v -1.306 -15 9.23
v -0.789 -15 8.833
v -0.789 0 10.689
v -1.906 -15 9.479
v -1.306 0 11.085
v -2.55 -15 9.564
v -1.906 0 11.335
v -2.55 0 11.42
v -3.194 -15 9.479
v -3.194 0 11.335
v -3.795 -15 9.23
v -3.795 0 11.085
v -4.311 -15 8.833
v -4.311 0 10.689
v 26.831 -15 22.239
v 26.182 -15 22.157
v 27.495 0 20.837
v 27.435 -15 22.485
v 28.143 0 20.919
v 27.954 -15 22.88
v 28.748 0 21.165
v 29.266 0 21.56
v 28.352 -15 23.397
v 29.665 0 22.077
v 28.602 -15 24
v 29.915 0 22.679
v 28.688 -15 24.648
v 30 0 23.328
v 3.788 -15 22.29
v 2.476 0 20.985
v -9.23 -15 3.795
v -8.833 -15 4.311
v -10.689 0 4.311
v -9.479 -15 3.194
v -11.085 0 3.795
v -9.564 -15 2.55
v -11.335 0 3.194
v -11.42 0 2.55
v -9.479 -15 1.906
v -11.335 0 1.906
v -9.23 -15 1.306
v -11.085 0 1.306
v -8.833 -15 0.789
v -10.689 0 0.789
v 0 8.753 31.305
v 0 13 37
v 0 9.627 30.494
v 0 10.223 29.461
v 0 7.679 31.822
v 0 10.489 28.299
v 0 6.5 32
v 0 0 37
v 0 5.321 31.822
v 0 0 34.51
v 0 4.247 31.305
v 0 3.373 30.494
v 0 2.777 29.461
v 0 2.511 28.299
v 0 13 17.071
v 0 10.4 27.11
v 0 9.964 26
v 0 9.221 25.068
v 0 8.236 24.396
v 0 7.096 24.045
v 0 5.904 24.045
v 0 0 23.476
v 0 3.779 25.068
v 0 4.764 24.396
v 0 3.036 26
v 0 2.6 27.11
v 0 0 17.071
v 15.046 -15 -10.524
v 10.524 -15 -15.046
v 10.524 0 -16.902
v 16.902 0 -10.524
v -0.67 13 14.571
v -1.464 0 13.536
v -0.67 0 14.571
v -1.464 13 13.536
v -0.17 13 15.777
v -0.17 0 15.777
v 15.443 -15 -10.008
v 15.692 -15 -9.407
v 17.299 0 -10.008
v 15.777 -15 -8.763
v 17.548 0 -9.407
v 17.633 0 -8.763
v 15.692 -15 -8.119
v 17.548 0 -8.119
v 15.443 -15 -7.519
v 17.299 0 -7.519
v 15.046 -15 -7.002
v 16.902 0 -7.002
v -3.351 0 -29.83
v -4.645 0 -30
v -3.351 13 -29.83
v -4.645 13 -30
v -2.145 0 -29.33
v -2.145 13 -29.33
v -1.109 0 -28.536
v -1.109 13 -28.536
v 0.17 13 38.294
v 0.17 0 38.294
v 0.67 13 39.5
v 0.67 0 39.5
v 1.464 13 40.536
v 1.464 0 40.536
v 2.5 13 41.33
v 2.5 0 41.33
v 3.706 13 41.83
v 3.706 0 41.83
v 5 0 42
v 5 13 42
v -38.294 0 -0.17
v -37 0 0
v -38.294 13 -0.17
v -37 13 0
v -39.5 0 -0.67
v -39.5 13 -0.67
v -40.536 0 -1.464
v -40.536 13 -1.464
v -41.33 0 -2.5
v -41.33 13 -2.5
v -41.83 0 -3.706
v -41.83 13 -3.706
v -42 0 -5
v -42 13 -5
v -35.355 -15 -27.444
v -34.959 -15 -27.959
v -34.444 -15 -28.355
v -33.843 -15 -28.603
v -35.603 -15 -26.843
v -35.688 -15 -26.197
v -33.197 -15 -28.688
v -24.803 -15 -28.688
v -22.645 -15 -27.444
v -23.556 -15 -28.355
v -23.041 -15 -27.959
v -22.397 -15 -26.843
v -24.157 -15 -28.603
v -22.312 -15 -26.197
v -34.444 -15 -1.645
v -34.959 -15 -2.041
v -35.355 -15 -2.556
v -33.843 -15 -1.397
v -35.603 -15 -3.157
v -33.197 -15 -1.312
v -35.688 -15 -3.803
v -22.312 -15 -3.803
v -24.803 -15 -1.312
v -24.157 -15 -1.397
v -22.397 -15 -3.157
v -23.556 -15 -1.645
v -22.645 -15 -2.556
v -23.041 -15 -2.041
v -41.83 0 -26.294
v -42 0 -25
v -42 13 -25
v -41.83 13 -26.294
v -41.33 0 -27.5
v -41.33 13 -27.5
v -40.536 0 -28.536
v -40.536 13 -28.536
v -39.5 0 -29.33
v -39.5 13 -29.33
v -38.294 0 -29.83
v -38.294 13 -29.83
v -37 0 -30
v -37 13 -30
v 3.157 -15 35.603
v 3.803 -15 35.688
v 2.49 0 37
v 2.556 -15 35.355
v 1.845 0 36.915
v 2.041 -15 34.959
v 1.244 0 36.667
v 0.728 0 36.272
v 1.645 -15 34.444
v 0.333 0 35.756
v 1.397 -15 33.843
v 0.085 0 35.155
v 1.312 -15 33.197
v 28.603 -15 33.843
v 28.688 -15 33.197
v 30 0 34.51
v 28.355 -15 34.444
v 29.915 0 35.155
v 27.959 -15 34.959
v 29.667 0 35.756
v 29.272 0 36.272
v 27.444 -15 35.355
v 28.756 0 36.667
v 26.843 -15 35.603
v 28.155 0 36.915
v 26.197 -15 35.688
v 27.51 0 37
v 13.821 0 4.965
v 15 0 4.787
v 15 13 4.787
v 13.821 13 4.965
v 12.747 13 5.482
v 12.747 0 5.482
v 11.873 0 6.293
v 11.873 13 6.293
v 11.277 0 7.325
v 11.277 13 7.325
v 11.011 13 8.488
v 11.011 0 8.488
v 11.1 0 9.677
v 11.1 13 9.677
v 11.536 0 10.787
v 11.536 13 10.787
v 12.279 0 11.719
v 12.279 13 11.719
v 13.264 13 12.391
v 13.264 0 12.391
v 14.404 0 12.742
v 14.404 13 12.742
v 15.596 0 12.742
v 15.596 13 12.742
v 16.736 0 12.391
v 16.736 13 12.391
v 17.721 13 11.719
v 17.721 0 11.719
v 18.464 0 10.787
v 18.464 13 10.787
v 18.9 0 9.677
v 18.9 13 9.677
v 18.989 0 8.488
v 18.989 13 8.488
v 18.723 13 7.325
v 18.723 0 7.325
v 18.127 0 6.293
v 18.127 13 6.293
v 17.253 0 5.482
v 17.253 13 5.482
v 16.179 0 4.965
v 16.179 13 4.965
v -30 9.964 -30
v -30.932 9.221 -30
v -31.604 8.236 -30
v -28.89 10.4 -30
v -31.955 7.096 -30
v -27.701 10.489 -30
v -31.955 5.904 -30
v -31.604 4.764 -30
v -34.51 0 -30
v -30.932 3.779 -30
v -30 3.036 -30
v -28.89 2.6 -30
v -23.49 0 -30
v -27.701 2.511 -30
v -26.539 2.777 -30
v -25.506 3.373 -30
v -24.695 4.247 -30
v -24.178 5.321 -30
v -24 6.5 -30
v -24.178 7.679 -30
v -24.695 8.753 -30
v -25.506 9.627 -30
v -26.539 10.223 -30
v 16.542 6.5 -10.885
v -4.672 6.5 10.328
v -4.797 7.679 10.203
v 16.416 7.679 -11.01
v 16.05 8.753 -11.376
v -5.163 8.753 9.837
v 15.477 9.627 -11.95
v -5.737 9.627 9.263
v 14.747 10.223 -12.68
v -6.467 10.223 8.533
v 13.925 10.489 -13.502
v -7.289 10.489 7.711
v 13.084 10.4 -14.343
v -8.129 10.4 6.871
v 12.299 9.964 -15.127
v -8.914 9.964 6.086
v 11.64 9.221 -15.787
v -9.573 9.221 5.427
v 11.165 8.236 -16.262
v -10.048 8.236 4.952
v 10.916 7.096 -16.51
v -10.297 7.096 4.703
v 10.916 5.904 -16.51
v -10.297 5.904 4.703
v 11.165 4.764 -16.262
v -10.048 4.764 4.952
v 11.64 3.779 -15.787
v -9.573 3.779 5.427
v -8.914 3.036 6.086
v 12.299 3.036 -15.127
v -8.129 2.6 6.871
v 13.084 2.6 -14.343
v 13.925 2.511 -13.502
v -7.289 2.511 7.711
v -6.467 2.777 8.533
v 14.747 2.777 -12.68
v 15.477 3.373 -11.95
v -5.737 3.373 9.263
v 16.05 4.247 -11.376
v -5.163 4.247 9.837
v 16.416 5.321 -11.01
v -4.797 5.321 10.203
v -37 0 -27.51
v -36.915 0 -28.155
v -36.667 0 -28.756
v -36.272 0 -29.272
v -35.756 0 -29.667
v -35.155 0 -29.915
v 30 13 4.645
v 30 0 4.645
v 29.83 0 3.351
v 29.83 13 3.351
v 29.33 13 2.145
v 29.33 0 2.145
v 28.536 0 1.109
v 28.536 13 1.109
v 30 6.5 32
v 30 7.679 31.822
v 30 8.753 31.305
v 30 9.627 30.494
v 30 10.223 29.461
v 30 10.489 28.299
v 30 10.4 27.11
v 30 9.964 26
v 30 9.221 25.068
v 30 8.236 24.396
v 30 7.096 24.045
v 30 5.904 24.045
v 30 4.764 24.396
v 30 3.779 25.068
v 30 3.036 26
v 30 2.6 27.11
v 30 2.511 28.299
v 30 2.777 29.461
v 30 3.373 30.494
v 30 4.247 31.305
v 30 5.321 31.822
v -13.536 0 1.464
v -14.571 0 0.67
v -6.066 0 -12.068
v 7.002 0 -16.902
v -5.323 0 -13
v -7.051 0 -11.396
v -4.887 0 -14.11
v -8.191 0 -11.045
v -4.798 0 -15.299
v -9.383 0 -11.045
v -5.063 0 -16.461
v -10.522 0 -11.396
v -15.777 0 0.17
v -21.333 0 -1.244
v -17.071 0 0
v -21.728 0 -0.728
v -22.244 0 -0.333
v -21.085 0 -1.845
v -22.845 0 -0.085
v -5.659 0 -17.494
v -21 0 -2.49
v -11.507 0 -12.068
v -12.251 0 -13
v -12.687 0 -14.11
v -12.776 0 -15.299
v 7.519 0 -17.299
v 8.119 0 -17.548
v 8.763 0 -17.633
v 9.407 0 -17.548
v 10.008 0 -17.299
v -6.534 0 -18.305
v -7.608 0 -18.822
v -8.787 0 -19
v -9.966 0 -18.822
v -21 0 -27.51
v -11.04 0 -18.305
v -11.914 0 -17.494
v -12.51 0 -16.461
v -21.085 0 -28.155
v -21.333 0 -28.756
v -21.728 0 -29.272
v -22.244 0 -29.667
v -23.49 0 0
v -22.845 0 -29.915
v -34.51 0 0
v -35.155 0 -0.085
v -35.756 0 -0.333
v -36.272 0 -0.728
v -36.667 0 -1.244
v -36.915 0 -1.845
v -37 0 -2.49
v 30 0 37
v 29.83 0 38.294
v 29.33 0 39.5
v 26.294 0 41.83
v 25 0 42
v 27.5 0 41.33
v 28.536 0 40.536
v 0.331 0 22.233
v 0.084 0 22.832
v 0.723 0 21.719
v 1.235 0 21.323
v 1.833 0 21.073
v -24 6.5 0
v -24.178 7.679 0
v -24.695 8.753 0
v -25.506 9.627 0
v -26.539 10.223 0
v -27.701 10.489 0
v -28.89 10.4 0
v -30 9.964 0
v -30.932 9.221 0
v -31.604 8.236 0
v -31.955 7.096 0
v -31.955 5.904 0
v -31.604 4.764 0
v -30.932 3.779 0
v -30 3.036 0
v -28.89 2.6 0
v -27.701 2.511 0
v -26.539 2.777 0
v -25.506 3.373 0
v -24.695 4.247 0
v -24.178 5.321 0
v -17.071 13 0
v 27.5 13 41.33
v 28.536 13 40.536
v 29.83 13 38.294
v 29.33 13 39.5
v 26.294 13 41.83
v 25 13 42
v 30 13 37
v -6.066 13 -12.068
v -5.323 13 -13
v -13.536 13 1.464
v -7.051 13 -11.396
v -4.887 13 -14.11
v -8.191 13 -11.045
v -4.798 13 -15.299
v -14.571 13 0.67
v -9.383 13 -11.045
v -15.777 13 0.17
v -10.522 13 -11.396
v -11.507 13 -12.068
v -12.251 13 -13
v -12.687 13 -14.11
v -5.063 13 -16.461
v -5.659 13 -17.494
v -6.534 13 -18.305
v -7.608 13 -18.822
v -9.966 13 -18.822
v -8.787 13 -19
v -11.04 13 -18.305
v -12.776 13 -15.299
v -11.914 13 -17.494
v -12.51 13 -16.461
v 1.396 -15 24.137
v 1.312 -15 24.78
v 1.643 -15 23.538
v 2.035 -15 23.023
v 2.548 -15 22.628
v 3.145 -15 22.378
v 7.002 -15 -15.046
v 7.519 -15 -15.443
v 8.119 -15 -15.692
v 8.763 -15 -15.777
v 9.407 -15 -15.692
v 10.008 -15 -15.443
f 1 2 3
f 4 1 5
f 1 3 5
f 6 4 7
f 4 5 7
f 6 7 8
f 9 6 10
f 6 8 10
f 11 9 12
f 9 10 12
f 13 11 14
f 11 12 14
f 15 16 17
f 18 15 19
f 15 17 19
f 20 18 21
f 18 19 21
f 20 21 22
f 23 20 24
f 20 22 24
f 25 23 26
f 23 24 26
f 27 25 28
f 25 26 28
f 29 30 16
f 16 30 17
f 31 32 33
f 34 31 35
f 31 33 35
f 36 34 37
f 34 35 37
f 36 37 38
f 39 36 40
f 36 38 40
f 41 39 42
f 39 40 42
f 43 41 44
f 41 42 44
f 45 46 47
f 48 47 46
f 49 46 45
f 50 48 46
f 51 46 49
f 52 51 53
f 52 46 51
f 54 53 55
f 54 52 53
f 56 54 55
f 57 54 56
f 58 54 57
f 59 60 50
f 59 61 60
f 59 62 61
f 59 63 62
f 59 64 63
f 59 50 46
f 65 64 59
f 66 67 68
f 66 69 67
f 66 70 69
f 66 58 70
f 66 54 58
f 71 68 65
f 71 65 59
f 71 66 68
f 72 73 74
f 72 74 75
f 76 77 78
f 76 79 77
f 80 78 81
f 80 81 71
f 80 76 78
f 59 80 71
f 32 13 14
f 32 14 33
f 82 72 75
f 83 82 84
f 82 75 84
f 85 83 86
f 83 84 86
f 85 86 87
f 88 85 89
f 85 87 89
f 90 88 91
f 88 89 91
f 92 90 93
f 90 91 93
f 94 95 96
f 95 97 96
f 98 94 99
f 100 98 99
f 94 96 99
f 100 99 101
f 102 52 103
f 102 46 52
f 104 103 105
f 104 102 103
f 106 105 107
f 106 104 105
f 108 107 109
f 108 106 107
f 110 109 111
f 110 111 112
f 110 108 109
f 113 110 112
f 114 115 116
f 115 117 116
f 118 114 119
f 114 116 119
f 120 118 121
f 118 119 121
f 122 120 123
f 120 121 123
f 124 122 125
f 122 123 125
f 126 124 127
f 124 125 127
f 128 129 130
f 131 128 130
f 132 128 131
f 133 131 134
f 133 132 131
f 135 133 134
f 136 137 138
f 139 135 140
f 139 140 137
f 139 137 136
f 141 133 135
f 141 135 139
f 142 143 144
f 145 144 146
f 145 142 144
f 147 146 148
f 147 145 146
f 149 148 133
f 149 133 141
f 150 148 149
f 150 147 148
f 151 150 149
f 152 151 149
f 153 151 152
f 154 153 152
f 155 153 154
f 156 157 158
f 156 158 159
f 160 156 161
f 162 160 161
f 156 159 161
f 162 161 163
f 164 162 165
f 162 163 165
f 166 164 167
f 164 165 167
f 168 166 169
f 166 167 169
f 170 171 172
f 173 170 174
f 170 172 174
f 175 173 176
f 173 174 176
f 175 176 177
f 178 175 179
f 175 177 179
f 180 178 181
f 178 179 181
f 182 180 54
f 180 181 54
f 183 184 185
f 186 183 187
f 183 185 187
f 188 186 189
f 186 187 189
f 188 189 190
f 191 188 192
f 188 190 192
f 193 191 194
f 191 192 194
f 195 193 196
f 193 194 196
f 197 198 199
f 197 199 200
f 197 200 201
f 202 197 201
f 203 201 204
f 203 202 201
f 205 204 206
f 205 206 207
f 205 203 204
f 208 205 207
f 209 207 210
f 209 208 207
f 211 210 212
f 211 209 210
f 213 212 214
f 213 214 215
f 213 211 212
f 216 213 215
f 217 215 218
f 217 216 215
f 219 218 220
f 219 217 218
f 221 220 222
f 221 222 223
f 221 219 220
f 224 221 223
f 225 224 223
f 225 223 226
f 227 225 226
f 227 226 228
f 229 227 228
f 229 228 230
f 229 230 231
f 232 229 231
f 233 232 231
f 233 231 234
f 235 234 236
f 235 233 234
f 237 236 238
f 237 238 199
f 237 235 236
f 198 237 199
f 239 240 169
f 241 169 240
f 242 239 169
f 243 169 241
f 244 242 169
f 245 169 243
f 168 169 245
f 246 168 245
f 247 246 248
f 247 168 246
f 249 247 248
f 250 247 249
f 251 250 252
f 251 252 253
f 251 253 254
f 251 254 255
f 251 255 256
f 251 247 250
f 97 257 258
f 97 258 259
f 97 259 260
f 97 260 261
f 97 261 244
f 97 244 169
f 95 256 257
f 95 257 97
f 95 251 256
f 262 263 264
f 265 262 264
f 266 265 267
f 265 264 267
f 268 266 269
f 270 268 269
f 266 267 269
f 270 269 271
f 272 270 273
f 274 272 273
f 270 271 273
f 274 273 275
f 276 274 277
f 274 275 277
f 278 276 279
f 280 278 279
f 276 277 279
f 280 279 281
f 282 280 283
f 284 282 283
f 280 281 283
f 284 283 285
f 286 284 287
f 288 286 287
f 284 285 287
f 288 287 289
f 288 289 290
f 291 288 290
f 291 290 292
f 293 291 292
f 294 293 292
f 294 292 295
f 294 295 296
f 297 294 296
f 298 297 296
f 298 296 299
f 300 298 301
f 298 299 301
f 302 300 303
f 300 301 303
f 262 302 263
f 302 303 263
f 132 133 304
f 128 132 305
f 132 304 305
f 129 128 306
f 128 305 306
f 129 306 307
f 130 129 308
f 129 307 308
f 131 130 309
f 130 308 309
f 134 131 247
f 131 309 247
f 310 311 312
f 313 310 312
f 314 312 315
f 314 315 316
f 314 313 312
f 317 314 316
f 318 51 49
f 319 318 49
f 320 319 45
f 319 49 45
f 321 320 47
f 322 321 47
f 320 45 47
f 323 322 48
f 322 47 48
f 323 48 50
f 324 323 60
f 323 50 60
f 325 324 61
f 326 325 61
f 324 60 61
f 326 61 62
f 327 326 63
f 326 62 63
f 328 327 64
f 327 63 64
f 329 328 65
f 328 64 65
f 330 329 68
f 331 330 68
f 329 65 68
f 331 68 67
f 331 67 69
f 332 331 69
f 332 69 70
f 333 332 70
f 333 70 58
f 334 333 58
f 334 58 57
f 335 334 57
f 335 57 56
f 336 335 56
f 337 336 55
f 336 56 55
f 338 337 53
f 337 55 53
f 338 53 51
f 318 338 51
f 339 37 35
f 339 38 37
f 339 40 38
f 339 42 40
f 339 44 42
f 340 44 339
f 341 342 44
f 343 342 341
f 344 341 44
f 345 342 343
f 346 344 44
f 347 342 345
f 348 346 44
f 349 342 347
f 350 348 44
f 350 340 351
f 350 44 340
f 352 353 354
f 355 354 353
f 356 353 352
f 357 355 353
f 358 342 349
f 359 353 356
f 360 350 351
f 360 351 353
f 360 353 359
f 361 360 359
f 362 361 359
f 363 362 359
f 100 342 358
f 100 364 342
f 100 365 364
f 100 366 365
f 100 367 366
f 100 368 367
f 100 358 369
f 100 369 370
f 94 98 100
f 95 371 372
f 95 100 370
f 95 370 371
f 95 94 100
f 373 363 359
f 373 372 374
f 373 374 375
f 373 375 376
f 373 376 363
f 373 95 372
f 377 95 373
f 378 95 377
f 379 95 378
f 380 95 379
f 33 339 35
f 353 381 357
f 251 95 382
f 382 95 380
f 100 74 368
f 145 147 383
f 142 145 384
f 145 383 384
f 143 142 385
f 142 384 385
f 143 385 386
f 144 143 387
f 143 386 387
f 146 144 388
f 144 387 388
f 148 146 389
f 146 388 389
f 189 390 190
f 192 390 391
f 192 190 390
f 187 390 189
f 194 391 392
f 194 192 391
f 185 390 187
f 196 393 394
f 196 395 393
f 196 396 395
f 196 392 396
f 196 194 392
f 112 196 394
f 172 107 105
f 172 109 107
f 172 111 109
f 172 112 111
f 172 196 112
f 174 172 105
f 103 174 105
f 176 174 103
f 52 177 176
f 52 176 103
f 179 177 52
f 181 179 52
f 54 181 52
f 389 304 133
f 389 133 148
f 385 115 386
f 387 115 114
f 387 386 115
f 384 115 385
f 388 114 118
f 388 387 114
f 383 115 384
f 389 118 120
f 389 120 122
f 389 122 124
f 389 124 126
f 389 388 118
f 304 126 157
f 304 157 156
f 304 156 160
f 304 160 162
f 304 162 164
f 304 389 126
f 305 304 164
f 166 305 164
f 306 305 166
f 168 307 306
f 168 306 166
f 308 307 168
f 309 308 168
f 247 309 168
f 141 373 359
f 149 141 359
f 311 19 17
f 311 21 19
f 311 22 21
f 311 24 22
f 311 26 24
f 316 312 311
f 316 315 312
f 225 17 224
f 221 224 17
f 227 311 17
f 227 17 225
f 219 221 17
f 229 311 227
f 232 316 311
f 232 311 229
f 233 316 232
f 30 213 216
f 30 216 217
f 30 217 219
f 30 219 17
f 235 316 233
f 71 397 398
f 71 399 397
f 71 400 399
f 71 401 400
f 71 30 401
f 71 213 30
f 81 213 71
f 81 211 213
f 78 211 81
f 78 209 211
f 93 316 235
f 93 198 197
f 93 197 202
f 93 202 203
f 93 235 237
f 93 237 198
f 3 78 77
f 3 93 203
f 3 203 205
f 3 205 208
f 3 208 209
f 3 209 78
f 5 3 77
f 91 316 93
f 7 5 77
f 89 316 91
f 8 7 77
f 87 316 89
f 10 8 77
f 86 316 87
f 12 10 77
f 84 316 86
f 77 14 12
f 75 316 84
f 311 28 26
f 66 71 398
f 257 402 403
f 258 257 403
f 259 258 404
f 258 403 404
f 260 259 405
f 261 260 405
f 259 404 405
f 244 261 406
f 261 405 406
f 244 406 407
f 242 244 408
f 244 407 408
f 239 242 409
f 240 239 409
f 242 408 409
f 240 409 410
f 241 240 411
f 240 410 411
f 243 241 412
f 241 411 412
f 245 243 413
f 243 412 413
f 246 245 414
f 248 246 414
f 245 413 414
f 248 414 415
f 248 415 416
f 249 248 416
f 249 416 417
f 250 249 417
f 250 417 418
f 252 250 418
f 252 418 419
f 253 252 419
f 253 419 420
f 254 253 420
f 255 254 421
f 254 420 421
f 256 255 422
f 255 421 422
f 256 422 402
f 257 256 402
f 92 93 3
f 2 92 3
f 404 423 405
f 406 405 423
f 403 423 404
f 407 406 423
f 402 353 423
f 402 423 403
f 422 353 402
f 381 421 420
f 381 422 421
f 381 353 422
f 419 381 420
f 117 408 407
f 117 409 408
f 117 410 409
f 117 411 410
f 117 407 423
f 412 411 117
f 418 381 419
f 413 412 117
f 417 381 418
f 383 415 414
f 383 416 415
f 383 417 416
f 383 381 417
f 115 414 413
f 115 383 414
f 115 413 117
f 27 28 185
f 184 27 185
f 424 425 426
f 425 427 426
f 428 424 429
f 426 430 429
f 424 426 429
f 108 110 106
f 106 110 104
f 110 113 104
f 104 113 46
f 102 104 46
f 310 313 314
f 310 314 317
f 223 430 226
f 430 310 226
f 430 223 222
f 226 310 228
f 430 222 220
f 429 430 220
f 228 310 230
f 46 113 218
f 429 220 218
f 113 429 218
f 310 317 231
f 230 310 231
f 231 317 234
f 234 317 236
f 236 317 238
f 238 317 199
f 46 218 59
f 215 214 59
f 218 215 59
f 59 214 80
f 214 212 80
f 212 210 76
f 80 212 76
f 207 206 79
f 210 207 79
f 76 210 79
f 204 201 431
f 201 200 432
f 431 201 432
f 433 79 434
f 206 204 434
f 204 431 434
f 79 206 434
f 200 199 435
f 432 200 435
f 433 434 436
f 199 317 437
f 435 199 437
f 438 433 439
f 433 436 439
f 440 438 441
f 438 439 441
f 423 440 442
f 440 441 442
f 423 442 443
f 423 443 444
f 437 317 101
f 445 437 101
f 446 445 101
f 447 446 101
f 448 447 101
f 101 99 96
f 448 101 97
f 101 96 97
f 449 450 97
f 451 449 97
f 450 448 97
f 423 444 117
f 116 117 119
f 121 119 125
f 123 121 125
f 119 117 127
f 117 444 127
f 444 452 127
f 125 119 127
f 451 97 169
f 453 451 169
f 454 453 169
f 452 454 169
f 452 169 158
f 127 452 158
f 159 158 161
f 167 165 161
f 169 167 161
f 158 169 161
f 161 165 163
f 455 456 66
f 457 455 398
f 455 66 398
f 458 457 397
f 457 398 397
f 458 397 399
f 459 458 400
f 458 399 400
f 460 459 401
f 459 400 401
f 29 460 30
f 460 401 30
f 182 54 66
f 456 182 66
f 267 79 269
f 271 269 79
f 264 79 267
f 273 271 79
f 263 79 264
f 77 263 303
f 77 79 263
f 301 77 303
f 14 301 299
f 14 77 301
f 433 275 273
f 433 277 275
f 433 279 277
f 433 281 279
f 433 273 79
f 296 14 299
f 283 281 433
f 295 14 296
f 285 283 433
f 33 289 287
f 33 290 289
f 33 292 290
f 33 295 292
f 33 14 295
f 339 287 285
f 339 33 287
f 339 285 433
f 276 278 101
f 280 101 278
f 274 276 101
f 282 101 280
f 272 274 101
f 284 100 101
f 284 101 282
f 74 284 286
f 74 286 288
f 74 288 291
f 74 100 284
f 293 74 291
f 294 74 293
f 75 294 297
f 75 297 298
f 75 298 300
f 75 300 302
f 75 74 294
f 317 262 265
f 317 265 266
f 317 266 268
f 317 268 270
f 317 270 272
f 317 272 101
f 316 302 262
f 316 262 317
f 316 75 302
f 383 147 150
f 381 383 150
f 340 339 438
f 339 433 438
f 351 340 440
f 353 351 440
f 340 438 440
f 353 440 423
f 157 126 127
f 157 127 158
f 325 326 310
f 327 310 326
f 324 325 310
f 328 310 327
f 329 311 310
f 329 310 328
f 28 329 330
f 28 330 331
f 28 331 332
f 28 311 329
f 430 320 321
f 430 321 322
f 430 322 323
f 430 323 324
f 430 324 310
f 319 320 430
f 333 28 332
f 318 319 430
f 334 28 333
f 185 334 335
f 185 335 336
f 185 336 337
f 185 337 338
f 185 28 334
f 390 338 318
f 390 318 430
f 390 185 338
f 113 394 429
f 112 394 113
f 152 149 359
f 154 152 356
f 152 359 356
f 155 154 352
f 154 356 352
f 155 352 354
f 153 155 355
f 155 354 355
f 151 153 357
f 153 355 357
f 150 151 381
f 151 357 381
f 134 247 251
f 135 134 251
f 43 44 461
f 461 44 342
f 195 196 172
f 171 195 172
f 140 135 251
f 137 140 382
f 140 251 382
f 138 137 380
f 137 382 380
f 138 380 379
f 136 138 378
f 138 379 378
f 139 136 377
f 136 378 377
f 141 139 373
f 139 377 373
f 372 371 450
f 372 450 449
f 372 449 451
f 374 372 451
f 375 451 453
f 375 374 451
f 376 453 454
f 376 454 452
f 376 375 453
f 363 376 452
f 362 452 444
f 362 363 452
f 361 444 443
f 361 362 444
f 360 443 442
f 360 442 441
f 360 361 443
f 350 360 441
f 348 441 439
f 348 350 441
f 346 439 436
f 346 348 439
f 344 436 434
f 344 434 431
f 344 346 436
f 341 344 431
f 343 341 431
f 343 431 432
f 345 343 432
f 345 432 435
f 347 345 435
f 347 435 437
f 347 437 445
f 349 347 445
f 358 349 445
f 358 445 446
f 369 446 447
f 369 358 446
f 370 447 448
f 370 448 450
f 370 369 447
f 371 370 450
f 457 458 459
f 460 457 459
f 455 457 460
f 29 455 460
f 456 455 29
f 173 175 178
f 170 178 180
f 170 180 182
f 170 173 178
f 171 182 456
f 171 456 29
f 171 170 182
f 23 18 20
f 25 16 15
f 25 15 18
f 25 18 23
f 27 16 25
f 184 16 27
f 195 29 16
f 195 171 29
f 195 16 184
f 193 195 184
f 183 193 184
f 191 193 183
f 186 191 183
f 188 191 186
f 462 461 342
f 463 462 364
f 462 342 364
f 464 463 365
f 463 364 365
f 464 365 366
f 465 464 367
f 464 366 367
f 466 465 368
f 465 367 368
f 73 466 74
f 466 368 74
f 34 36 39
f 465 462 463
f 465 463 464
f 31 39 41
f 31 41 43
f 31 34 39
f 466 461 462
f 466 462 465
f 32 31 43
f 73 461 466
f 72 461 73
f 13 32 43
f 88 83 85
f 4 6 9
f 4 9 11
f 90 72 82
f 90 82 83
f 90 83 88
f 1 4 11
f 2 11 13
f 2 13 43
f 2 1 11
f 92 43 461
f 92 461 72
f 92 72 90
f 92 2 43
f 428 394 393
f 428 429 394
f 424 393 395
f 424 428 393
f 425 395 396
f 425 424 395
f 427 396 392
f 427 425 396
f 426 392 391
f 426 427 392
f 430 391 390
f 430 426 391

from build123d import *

# Parameters (mm, degrees)
SKETCH1_R                = 4
EXTRUDE1_DEPTH           = 13
FILLET5_R                = 5
SKETCH5_R                = 4
EXTRUDE5_DEPTH           = 30
SKETCH6_R                = 4
EXTRUDE6_DEPTH           = 30
SKETCH8_R                = 4
EXTRUDE7_DEPTH           = 30
SKETCH9_W                = 16
SKETCH9_H                = 30
EXTRUDE8_DEPTH           = 15
EXTRUDE8_DRAFT           = 5
EXTRUDE8_PROFILE_2_DEPTH = 15
EXTRUDE8_PROFILE_2_DRAFT = 5
EXTRUDE8_PROFILE_3_DEPTH = 15
EXTRUDE8_PROFILE_3_DRAFT = 5
FILLET8_R                = 2.5


with BuildPart() as part:
    # Sketch1 → Extrude1 (new body)
    with BuildSketch(Plane(origin=(0, 0, 0), x_dir=(1, 0, 0), z_dir=(0, 1, 0))):
        Polygon((0, -15), (-15, 0), (-42, 0), (-42, 30), (-2.573593129, 30), (30, -2.573593129), (30, -42), (0, -42), align=None)
        with Locations(Location((-8.786796564, 15, 0), (0, 0, 90))):
            Circle(SKETCH1_R, mode=Mode.SUBTRACT)
        with Locations(Location((15, -8.786796564, 0), (0, 0, 90))):
            Circle(SKETCH1_R, mode=Mode.SUBTRACT)
    extrude(amount=EXTRUDE1_DEPTH)

    # Fillet5
    fillet5_edges = [part.edges().sort_by_distance(p)[0] for p in [
        (-42, 6.5, 0),
        (-42, 6.5, -30),
        (-2.573593129, 6.5, -30),
        (30, 6.5, 2.573593129),
        (30, 6.5, 42),
        (0, 6.5, 42),
        (0, 6.5, 15),
        (-15, 6.5, 0),
    ]]
    fillet(fillet5_edges, radius=FILLET5_R)

    # Sketch5 → Extrude5 (cut)
    with BuildSketch(Plane(origin=(-7.5, 0, 7.5), x_dir=(0.7071067811865476, 0, 0.7071067811865476), z_dir=(-0.7071067811865476, 0, 0.7071067811865476))):
        with Locations((0, 6.5)):
            Circle(SKETCH5_R)
    extrude(amount=-EXTRUDE5_DEPTH, mode=Mode.SUBTRACT)

    # Sketch6 → Extrude6 (cut)
    with BuildSketch(Plane.XY):
        with Locations((-28, 6.5)):
            Circle(SKETCH6_R)
    extrude(amount=-EXTRUDE6_DEPTH, mode=Mode.SUBTRACT)

    # Sketch8 → Extrude7 (cut)
    with BuildSketch(Plane.ZY):
        with Locations((28, 6.5)):
            Circle(SKETCH8_R)
    extrude(amount=-EXTRUDE7_DEPTH, mode=Mode.SUBTRACT)


with BuildPart() as extrude8_tool:
    # Sketch9 → Extrude8 (with draft: the straight prism first)
    with BuildSketch(Plane.XZ):
        with Locations((-29, -15)):
            Rectangle(SKETCH9_W, SKETCH9_H)
    extrude(amount=EXTRUDE8_DEPTH)
    # Extrude8: the draft: its side faces are tilted about the plane it starts from
    extrude8_sides = [extrude8_tool.faces().sort_by_distance(p)[0] for p in [
        (-29, -7.5, -30),
        (-21, -7.5, -15),
        (-29, -7.5, 0),
        (-37, -7.5, -15),
    ]]
    draft(extrude8_sides, Plane.XZ, EXTRUDE8_DRAFT)


with BuildPart() as part_1:
    add(part.part)

    # Extrude8: add extrude8_tool
    add(extrude8_tool.part)


with BuildPart() as extrude8_profile_2_tool:
    # Sketch9 → Extrude8 profile 2 (with draft: the straight prism first)
    with BuildSketch(Plane.XZ):
        Polygon((18.662950904, -8.763455967), (-2.550252532, 12.449747468), (-12.449747468, 2.550252532), (8.763455967, -18.662950904), align=None)
    extrude(amount=EXTRUDE8_PROFILE_2_DEPTH)
    # Extrude8 profile 2: the draft: its side faces are tilted about the plane it starts from
    extrude8_profile_2_sides = [extrude8_profile_2_tool.faces().sort_by_distance(p)[0] for p in [
        (8.056349186, -7.5, 1.843145751),
        (-7.5, -7.5, 7.5),
        (-1.843145751, -7.5, -8.056349186),
        (13.713203436, -7.5, -13.713203436),
    ]]
    draft(extrude8_profile_2_sides, Plane.XZ, EXTRUDE8_PROFILE_2_DRAFT)


with BuildPart() as part_2:
    add(part_1.part)

    # Extrude8 profile 2: add extrude8_profile_2_tool
    add(extrude8_profile_2_tool.part)


with BuildPart() as extrude8_profile_3_tool:
    # Sketch9 → Extrude8 profile 3 (with draft: the straight prism first)
    with BuildSketch(Plane.XZ):
        Polygon((30, 37), (0, 37), (0, 21), (30, 20.82233047), align=None)
    extrude(amount=EXTRUDE8_PROFILE_3_DEPTH)
    # Extrude8 profile 3: the draft: its side faces are tilted about the plane it starts from
    extrude8_profile_3_sides = [extrude8_profile_3_tool.faces().sort_by_distance(p)[0] for p in [
        (15, -7.5, 37),
        (0, -7.5, 29),
        (15, -7.5, 20.911165235),
        (30, -7.5, 28.911165235),
    ]]
    draft(extrude8_profile_3_sides, Plane.XZ, EXTRUDE8_PROFILE_3_DRAFT)


with BuildPart() as part_3:
    add(part_2.part)

    # Extrude8 profile 3: add extrude8_profile_3_tool
    add(extrude8_profile_3_tool.part)

    # Fillet8
    # the kernel refuses this fillet: 2.5 mm, written as the material it takes off along each edge
    with BuildSketch(Plane(origin=(-13.211385745, 6.155764282, 2.550252532), x_dir=(0.6990853645605914, 0.08649619246092898, 0.7097873355780214), z_dir=(0.12279134661747972, -0.9924325091389671, 0))) as fillet8_piece_1_section:
        with BuildLine():
            CenterArc((FILLET8_R * 0.992432509139, -FILLET8_R), FILLET8_R, 90, 89.564769998)
            Line((-FILLET8_R * 0.00753863989878, -FILLET8_R * 0.992403876506), (0, 0))
            Line((0, 0), (FILLET8_R * 0.992432509139, 0))
        make_face()
    fillet8_piece_1 = extrude(amount=27.519784281, mode=Mode.PRIVATE)
    fillet8_piece_1 = split(fillet8_piece_1, bisect_by=Plane(origin=(-10.350961521, 0, 2.550252532), z_dir=(0, -1, 0)), keep=Keep.TOP, mode=Mode.PRIVATE)
    add(fillet8_piece_1, mode=Mode.SUBTRACT)
    with BuildSketch(Plane(origin=(-2.550252532, 6.155764282, 13.211385745), x_dir=(-0.7097873355780224, 0.08649619246092884, -0.6990853645605904), z_dir=(0, -0.9924325091389671, -0.12279134661747967))) as fillet8_piece_2_section:
        with BuildLine():
            CenterArc((FILLET8_R * 0.992432509139, FILLET8_R), FILLET8_R, 180.435230002, 89.564769998)
            Line((-FILLET8_R * 0.00753863989878, FILLET8_R * 0.992403876506), (0, 0))
            Line((0, 0), (FILLET8_R * 0.992432509139, 0))
        make_face()
    fillet8_piece_2 = extrude(amount=27.519784281, mode=Mode.PRIVATE)
    fillet8_piece_2 = split(fillet8_piece_2, bisect_by=Plane(origin=(-2.550252532, 0, 10.350961521), z_dir=(0, -1, 0)), keep=Keep.TOP, mode=Mode.PRIVATE)
    add(fillet8_piece_2, mode=Mode.SUBTRACT)
    with BuildSketch(Plane(origin=(-0.535427042, 6.119959098, 20.467734537), x_dir=(0.9962056349623634, 0.08598926801855533, -0.01342306428755091), z_dir=(0.0868304478214788, -0.9924765600716912, 0.08631773305285761))) as fillet8_piece_3_section:
        with BuildLine():
            CenterArc((FILLET8_R * 0.98661620345, FILLET8_R), FILLET8_R, 180.77198953, 89.22801047)
            Line((-FILLET8_R * 0.0132930268312, FILLET8_R * 0.986526648575), (0, 0))
            Line((0, 0), (FILLET8_R * 0.98661620345, 0))
        make_face()
    fillet8_piece_3 = extrude(amount=27.44640961, mode=Mode.PRIVATE)
    fillet8_piece_3 = split(fillet8_piece_3, bisect_by=Plane(origin=(1.478852111, 0, 22.470119813), z_dir=(0, -1, 0)), keep=Keep.TOP, mode=Mode.PRIVATE)
    add(fillet8_piece_3, mode=Mode.SUBTRACT)
    with BuildSketch(Plane(origin=(-0.53855959, 6.155764282, 37.53855959), x_dir=(-0.007567436278487758, 0.0864961924609277, -0.9962234400966146), z_dir=(0.08682659386424772, -0.9924325091389672, -0.08682659386424656))) as fillet8_piece_4_section:
        with BuildLine():
            CenterArc((FILLET8_R * 0.992432509139, FILLET8_R), FILLET8_R, 180.435230002, 89.564769998)
            Line((-FILLET8_R * 0.00753863989879, FILLET8_R * 0.992403876506), (0, 0))
            Line((0, 0), (FILLET8_R * 0.992432509139, 0))
        make_face()
    fillet8_piece_4 = extrude(amount=27.519784281, mode=Mode.PRIVATE)
    fillet8_piece_4 = split(fillet8_piece_4, bisect_by=Plane(origin=(1.484065776, 0, 35.515934224), z_dir=(0, -1, 0)), keep=Keep.TOP, mode=Mode.PRIVATE)
    add(fillet8_piece_4, mode=Mode.SUBTRACT)
    with BuildSketch(Plane(origin=(-37.53855959, 6.155764282, 0.53855959), x_dir=(0.9962234400966147, 0.08649619246092866, 0.00756743627848773), z_dir=(0.0868265938642475, -0.9924325091389671, -0.08682659386424771))) as fillet8_piece_5_section:
        with BuildLine():
            CenterArc((FILLET8_R * 0.992432509139, -FILLET8_R), FILLET8_R, 90, 89.564769998)
            Line((-FILLET8_R * 0.00753863989878, -FILLET8_R * 0.992403876506), (0, 0))
            Line((0, 0), (FILLET8_R * 0.992432509139, 0))
        make_face()
    fillet8_piece_5 = extrude(amount=27.519784281, mode=Mode.PRIVATE)
    fillet8_piece_5 = split(fillet8_piece_5, bisect_by=Plane(origin=(-35.515934224, 0, -1.484065776), z_dir=(0, -1, 0)), keep=Keep.TOP, mode=Mode.PRIVATE)
    add(fillet8_piece_5, mode=Mode.SUBTRACT)
    with BuildSketch(Plane(origin=(-37.53855959, 6.155764282, -30.53855959), x_dir=(0.9962234400966145, 0.08649619246092907, -0.007567436278487628), z_dir=(0.08682659386424792, -0.9924325091389671, 0.08682659386424772))) as fillet8_piece_6_section:
        with BuildLine():
            CenterArc((FILLET8_R * 0.992432509139, FILLET8_R), FILLET8_R, 180.435230002, 89.564769998)
            Line((-FILLET8_R * 0.00753863989877, FILLET8_R * 0.992403876506), (0, 0))
            Line((0, 0), (FILLET8_R * 0.992432509139, 0))
        make_face()
    fillet8_piece_6 = extrude(amount=27.519784281, mode=Mode.PRIVATE)
    fillet8_piece_6 = split(fillet8_piece_6, bisect_by=Plane(origin=(-35.515934224, 0, -28.515934224), z_dir=(0, -1, 0)), keep=Keep.TOP, mode=Mode.PRIVATE)
    add(fillet8_piece_6, mode=Mode.SUBTRACT)
    with BuildSketch(Plane(origin=(-20.46144041, 6.155764282, 0.53855959), x_dir=(0.007567436278484768, 0.08649619246092911, -0.9962234400966145), z_dir=(-0.0868265938642479, -0.9924325091389671, -0.08682659386424771))) as fillet8_piece_7_section:
        with BuildLine():
            CenterArc((FILLET8_R * 0.992432509139, -FILLET8_R), FILLET8_R, 90, 89.564769998)
            Line((-FILLET8_R * 0.00753863989877, -FILLET8_R * 0.992403876506), (0, 0))
            Line((0, 0), (FILLET8_R * 0.992432509139, 0))
        make_face()
    fillet8_piece_7 = extrude(amount=27.519784281, mode=Mode.PRIVATE)
    fillet8_piece_7 = split(fillet8_piece_7, bisect_by=Plane(origin=(-22.484065776, 0, -1.484065776), z_dir=(0, -1, 0)), keep=Keep.TOP, mode=Mode.PRIVATE)
    add(fillet8_piece_7, mode=Mode.SUBTRACT)
    with BuildSketch(Plane(origin=(8.763455967, 6.155764282, -19.42458918), x_dir=(-0.7097873355780235, 0.08649619246092868, 0.6990853645605893), z_dir=(0, -0.9924325091389671, 0.12279134661747969))) as fillet8_piece_8_section:
        with BuildLine():
            CenterArc((FILLET8_R * 0.992432509139, -FILLET8_R), FILLET8_R, 90, 89.564769998)
            Line((-FILLET8_R * 0.00753863989878, -FILLET8_R * 0.992403876506), (0, 0))
            Line((0, 0), (FILLET8_R * 0.992432509139, 0))
        make_face()
    fillet8_piece_8 = extrude(amount=27.519784281, mode=Mode.PRIVATE)
    fillet8_piece_8 = split(fillet8_piece_8, bisect_by=Plane(origin=(8.763455967, 0, -16.564164956), z_dir=(0, -1, 0)), keep=Keep.TOP, mode=Mode.PRIVATE)
    add(fillet8_piece_8, mode=Mode.SUBTRACT)
    with BuildSketch(Plane(origin=(30.53855959, 6.155764282, 37.53855959), x_dir=(0.0075674362784875545, 0.08649619246093003, -0.9962234400966146), z_dir=(-0.08682659386424771, -0.9924325091389671, -0.08682659386424886))) as fillet8_piece_9_section:
        with BuildLine():
            CenterArc((FILLET8_R * 0.992432509139, -FILLET8_R), FILLET8_R, 90, 89.564769998)
            Line((-FILLET8_R * 0.00753863989876, -FILLET8_R * 0.992403876506), (0, 0))
            Line((0, 0), (FILLET8_R * 0.992432509139, 0))
        make_face()
    fillet8_piece_9 = extrude(amount=27.519784281, mode=Mode.PRIVATE)
    fillet8_piece_9 = split(fillet8_piece_9, bisect_by=Plane(origin=(28.515934224, 0, 35.515934224), z_dir=(0, -1, 0)), keep=Keep.TOP, mode=Mode.PRIVATE)
    add(fillet8_piece_9, mode=Mode.SUBTRACT)
    with BuildSketch(Plane(origin=(30.541709896, 6.191772448, 20.277402896), x_dir=(-0.9962063107197006, 0.08700605966245174, -0.001712327146725053), z_dir=(-0.08682269450948527, -0.9923879393100855, 0.08733840867564902))) as fillet8_piece_10_section:
        with BuildLine():
            CenterArc((FILLET8_R * 0.998282579203, -FILLET8_R), FILLET8_R, 90, 89.90151449)
            Line((-FILLET8_R * 0.00171594349532, -FILLET8_R * 0.998281104438), (0, 0))
            Line((0, 0), (FILLET8_R * 0.998282579203, 0))
        make_face()
    fillet8_piece_10 = extrude(amount=27.593588969, mode=Mode.PRIVATE)
    fillet8_piece_10 = split(fillet8_piece_10, bisect_by=Plane(origin=(28.510705055, 0, 22.320471611), z_dir=(0, -1, 0)), keep=Keep.TOP, mode=Mode.PRIVATE)
    add(fillet8_piece_10, mode=Mode.SUBTRACT)
    with BuildSketch(Plane(origin=(-20.46144041, 6.155764282, -30.53855959), x_dir=(0.007567436278490545, 0.0864961924609286, 0.9962234400966147), z_dir=(-0.08682659386424751, -0.9924325091389671, 0.0868265938642477))) as fillet8_piece_11_section:
        with BuildLine():
            CenterArc((FILLET8_R * 0.992432509139, FILLET8_R), FILLET8_R, 180.435230002, 89.564769998)
            Line((-FILLET8_R * 0.00753863989878, FILLET8_R * 0.992403876506), (0, 0))
            Line((0, 0), (FILLET8_R * 0.992432509139, 0))
        make_face()
    fillet8_piece_11 = extrude(amount=27.519784281, mode=Mode.PRIVATE)
    fillet8_piece_11 = split(fillet8_piece_11, bisect_by=Plane(origin=(-22.484065776, 0, -28.515934224), z_dir=(0, -1, 0)), keep=Keep.TOP, mode=Mode.PRIVATE)
    add(fillet8_piece_11, mode=Mode.SUBTRACT)
    with BuildSketch(Plane(origin=(19.42458918, 6.155764282, -8.763455967), x_dir=(-0.6990853645605911, 0.08649619246092893, 0.7097873355780219), z_dir=(-0.1227913466174797, -0.9924325091389671, 0))) as fillet8_piece_12_section:
        with BuildLine():
            CenterArc((FILLET8_R * 0.992432509139, FILLET8_R), FILLET8_R, 180.435230002, 89.564769998)
            Line((-FILLET8_R * 0.00753863989878, FILLET8_R * 0.992403876506), (0, 0))
            Line((0, 0), (FILLET8_R * 0.992432509139, 0))
        make_face()
    fillet8_piece_12 = extrude(amount=27.519784281, mode=Mode.PRIVATE)
    fillet8_piece_12 = split(fillet8_piece_12, bisect_by=Plane(origin=(16.564164956, 0, -8.763455967), z_dir=(0, -1, 0)), keep=Keep.TOP, mode=Mode.PRIVATE)
    add(fillet8_piece_12, mode=Mode.SUBTRACT)


solid = part_3.part
